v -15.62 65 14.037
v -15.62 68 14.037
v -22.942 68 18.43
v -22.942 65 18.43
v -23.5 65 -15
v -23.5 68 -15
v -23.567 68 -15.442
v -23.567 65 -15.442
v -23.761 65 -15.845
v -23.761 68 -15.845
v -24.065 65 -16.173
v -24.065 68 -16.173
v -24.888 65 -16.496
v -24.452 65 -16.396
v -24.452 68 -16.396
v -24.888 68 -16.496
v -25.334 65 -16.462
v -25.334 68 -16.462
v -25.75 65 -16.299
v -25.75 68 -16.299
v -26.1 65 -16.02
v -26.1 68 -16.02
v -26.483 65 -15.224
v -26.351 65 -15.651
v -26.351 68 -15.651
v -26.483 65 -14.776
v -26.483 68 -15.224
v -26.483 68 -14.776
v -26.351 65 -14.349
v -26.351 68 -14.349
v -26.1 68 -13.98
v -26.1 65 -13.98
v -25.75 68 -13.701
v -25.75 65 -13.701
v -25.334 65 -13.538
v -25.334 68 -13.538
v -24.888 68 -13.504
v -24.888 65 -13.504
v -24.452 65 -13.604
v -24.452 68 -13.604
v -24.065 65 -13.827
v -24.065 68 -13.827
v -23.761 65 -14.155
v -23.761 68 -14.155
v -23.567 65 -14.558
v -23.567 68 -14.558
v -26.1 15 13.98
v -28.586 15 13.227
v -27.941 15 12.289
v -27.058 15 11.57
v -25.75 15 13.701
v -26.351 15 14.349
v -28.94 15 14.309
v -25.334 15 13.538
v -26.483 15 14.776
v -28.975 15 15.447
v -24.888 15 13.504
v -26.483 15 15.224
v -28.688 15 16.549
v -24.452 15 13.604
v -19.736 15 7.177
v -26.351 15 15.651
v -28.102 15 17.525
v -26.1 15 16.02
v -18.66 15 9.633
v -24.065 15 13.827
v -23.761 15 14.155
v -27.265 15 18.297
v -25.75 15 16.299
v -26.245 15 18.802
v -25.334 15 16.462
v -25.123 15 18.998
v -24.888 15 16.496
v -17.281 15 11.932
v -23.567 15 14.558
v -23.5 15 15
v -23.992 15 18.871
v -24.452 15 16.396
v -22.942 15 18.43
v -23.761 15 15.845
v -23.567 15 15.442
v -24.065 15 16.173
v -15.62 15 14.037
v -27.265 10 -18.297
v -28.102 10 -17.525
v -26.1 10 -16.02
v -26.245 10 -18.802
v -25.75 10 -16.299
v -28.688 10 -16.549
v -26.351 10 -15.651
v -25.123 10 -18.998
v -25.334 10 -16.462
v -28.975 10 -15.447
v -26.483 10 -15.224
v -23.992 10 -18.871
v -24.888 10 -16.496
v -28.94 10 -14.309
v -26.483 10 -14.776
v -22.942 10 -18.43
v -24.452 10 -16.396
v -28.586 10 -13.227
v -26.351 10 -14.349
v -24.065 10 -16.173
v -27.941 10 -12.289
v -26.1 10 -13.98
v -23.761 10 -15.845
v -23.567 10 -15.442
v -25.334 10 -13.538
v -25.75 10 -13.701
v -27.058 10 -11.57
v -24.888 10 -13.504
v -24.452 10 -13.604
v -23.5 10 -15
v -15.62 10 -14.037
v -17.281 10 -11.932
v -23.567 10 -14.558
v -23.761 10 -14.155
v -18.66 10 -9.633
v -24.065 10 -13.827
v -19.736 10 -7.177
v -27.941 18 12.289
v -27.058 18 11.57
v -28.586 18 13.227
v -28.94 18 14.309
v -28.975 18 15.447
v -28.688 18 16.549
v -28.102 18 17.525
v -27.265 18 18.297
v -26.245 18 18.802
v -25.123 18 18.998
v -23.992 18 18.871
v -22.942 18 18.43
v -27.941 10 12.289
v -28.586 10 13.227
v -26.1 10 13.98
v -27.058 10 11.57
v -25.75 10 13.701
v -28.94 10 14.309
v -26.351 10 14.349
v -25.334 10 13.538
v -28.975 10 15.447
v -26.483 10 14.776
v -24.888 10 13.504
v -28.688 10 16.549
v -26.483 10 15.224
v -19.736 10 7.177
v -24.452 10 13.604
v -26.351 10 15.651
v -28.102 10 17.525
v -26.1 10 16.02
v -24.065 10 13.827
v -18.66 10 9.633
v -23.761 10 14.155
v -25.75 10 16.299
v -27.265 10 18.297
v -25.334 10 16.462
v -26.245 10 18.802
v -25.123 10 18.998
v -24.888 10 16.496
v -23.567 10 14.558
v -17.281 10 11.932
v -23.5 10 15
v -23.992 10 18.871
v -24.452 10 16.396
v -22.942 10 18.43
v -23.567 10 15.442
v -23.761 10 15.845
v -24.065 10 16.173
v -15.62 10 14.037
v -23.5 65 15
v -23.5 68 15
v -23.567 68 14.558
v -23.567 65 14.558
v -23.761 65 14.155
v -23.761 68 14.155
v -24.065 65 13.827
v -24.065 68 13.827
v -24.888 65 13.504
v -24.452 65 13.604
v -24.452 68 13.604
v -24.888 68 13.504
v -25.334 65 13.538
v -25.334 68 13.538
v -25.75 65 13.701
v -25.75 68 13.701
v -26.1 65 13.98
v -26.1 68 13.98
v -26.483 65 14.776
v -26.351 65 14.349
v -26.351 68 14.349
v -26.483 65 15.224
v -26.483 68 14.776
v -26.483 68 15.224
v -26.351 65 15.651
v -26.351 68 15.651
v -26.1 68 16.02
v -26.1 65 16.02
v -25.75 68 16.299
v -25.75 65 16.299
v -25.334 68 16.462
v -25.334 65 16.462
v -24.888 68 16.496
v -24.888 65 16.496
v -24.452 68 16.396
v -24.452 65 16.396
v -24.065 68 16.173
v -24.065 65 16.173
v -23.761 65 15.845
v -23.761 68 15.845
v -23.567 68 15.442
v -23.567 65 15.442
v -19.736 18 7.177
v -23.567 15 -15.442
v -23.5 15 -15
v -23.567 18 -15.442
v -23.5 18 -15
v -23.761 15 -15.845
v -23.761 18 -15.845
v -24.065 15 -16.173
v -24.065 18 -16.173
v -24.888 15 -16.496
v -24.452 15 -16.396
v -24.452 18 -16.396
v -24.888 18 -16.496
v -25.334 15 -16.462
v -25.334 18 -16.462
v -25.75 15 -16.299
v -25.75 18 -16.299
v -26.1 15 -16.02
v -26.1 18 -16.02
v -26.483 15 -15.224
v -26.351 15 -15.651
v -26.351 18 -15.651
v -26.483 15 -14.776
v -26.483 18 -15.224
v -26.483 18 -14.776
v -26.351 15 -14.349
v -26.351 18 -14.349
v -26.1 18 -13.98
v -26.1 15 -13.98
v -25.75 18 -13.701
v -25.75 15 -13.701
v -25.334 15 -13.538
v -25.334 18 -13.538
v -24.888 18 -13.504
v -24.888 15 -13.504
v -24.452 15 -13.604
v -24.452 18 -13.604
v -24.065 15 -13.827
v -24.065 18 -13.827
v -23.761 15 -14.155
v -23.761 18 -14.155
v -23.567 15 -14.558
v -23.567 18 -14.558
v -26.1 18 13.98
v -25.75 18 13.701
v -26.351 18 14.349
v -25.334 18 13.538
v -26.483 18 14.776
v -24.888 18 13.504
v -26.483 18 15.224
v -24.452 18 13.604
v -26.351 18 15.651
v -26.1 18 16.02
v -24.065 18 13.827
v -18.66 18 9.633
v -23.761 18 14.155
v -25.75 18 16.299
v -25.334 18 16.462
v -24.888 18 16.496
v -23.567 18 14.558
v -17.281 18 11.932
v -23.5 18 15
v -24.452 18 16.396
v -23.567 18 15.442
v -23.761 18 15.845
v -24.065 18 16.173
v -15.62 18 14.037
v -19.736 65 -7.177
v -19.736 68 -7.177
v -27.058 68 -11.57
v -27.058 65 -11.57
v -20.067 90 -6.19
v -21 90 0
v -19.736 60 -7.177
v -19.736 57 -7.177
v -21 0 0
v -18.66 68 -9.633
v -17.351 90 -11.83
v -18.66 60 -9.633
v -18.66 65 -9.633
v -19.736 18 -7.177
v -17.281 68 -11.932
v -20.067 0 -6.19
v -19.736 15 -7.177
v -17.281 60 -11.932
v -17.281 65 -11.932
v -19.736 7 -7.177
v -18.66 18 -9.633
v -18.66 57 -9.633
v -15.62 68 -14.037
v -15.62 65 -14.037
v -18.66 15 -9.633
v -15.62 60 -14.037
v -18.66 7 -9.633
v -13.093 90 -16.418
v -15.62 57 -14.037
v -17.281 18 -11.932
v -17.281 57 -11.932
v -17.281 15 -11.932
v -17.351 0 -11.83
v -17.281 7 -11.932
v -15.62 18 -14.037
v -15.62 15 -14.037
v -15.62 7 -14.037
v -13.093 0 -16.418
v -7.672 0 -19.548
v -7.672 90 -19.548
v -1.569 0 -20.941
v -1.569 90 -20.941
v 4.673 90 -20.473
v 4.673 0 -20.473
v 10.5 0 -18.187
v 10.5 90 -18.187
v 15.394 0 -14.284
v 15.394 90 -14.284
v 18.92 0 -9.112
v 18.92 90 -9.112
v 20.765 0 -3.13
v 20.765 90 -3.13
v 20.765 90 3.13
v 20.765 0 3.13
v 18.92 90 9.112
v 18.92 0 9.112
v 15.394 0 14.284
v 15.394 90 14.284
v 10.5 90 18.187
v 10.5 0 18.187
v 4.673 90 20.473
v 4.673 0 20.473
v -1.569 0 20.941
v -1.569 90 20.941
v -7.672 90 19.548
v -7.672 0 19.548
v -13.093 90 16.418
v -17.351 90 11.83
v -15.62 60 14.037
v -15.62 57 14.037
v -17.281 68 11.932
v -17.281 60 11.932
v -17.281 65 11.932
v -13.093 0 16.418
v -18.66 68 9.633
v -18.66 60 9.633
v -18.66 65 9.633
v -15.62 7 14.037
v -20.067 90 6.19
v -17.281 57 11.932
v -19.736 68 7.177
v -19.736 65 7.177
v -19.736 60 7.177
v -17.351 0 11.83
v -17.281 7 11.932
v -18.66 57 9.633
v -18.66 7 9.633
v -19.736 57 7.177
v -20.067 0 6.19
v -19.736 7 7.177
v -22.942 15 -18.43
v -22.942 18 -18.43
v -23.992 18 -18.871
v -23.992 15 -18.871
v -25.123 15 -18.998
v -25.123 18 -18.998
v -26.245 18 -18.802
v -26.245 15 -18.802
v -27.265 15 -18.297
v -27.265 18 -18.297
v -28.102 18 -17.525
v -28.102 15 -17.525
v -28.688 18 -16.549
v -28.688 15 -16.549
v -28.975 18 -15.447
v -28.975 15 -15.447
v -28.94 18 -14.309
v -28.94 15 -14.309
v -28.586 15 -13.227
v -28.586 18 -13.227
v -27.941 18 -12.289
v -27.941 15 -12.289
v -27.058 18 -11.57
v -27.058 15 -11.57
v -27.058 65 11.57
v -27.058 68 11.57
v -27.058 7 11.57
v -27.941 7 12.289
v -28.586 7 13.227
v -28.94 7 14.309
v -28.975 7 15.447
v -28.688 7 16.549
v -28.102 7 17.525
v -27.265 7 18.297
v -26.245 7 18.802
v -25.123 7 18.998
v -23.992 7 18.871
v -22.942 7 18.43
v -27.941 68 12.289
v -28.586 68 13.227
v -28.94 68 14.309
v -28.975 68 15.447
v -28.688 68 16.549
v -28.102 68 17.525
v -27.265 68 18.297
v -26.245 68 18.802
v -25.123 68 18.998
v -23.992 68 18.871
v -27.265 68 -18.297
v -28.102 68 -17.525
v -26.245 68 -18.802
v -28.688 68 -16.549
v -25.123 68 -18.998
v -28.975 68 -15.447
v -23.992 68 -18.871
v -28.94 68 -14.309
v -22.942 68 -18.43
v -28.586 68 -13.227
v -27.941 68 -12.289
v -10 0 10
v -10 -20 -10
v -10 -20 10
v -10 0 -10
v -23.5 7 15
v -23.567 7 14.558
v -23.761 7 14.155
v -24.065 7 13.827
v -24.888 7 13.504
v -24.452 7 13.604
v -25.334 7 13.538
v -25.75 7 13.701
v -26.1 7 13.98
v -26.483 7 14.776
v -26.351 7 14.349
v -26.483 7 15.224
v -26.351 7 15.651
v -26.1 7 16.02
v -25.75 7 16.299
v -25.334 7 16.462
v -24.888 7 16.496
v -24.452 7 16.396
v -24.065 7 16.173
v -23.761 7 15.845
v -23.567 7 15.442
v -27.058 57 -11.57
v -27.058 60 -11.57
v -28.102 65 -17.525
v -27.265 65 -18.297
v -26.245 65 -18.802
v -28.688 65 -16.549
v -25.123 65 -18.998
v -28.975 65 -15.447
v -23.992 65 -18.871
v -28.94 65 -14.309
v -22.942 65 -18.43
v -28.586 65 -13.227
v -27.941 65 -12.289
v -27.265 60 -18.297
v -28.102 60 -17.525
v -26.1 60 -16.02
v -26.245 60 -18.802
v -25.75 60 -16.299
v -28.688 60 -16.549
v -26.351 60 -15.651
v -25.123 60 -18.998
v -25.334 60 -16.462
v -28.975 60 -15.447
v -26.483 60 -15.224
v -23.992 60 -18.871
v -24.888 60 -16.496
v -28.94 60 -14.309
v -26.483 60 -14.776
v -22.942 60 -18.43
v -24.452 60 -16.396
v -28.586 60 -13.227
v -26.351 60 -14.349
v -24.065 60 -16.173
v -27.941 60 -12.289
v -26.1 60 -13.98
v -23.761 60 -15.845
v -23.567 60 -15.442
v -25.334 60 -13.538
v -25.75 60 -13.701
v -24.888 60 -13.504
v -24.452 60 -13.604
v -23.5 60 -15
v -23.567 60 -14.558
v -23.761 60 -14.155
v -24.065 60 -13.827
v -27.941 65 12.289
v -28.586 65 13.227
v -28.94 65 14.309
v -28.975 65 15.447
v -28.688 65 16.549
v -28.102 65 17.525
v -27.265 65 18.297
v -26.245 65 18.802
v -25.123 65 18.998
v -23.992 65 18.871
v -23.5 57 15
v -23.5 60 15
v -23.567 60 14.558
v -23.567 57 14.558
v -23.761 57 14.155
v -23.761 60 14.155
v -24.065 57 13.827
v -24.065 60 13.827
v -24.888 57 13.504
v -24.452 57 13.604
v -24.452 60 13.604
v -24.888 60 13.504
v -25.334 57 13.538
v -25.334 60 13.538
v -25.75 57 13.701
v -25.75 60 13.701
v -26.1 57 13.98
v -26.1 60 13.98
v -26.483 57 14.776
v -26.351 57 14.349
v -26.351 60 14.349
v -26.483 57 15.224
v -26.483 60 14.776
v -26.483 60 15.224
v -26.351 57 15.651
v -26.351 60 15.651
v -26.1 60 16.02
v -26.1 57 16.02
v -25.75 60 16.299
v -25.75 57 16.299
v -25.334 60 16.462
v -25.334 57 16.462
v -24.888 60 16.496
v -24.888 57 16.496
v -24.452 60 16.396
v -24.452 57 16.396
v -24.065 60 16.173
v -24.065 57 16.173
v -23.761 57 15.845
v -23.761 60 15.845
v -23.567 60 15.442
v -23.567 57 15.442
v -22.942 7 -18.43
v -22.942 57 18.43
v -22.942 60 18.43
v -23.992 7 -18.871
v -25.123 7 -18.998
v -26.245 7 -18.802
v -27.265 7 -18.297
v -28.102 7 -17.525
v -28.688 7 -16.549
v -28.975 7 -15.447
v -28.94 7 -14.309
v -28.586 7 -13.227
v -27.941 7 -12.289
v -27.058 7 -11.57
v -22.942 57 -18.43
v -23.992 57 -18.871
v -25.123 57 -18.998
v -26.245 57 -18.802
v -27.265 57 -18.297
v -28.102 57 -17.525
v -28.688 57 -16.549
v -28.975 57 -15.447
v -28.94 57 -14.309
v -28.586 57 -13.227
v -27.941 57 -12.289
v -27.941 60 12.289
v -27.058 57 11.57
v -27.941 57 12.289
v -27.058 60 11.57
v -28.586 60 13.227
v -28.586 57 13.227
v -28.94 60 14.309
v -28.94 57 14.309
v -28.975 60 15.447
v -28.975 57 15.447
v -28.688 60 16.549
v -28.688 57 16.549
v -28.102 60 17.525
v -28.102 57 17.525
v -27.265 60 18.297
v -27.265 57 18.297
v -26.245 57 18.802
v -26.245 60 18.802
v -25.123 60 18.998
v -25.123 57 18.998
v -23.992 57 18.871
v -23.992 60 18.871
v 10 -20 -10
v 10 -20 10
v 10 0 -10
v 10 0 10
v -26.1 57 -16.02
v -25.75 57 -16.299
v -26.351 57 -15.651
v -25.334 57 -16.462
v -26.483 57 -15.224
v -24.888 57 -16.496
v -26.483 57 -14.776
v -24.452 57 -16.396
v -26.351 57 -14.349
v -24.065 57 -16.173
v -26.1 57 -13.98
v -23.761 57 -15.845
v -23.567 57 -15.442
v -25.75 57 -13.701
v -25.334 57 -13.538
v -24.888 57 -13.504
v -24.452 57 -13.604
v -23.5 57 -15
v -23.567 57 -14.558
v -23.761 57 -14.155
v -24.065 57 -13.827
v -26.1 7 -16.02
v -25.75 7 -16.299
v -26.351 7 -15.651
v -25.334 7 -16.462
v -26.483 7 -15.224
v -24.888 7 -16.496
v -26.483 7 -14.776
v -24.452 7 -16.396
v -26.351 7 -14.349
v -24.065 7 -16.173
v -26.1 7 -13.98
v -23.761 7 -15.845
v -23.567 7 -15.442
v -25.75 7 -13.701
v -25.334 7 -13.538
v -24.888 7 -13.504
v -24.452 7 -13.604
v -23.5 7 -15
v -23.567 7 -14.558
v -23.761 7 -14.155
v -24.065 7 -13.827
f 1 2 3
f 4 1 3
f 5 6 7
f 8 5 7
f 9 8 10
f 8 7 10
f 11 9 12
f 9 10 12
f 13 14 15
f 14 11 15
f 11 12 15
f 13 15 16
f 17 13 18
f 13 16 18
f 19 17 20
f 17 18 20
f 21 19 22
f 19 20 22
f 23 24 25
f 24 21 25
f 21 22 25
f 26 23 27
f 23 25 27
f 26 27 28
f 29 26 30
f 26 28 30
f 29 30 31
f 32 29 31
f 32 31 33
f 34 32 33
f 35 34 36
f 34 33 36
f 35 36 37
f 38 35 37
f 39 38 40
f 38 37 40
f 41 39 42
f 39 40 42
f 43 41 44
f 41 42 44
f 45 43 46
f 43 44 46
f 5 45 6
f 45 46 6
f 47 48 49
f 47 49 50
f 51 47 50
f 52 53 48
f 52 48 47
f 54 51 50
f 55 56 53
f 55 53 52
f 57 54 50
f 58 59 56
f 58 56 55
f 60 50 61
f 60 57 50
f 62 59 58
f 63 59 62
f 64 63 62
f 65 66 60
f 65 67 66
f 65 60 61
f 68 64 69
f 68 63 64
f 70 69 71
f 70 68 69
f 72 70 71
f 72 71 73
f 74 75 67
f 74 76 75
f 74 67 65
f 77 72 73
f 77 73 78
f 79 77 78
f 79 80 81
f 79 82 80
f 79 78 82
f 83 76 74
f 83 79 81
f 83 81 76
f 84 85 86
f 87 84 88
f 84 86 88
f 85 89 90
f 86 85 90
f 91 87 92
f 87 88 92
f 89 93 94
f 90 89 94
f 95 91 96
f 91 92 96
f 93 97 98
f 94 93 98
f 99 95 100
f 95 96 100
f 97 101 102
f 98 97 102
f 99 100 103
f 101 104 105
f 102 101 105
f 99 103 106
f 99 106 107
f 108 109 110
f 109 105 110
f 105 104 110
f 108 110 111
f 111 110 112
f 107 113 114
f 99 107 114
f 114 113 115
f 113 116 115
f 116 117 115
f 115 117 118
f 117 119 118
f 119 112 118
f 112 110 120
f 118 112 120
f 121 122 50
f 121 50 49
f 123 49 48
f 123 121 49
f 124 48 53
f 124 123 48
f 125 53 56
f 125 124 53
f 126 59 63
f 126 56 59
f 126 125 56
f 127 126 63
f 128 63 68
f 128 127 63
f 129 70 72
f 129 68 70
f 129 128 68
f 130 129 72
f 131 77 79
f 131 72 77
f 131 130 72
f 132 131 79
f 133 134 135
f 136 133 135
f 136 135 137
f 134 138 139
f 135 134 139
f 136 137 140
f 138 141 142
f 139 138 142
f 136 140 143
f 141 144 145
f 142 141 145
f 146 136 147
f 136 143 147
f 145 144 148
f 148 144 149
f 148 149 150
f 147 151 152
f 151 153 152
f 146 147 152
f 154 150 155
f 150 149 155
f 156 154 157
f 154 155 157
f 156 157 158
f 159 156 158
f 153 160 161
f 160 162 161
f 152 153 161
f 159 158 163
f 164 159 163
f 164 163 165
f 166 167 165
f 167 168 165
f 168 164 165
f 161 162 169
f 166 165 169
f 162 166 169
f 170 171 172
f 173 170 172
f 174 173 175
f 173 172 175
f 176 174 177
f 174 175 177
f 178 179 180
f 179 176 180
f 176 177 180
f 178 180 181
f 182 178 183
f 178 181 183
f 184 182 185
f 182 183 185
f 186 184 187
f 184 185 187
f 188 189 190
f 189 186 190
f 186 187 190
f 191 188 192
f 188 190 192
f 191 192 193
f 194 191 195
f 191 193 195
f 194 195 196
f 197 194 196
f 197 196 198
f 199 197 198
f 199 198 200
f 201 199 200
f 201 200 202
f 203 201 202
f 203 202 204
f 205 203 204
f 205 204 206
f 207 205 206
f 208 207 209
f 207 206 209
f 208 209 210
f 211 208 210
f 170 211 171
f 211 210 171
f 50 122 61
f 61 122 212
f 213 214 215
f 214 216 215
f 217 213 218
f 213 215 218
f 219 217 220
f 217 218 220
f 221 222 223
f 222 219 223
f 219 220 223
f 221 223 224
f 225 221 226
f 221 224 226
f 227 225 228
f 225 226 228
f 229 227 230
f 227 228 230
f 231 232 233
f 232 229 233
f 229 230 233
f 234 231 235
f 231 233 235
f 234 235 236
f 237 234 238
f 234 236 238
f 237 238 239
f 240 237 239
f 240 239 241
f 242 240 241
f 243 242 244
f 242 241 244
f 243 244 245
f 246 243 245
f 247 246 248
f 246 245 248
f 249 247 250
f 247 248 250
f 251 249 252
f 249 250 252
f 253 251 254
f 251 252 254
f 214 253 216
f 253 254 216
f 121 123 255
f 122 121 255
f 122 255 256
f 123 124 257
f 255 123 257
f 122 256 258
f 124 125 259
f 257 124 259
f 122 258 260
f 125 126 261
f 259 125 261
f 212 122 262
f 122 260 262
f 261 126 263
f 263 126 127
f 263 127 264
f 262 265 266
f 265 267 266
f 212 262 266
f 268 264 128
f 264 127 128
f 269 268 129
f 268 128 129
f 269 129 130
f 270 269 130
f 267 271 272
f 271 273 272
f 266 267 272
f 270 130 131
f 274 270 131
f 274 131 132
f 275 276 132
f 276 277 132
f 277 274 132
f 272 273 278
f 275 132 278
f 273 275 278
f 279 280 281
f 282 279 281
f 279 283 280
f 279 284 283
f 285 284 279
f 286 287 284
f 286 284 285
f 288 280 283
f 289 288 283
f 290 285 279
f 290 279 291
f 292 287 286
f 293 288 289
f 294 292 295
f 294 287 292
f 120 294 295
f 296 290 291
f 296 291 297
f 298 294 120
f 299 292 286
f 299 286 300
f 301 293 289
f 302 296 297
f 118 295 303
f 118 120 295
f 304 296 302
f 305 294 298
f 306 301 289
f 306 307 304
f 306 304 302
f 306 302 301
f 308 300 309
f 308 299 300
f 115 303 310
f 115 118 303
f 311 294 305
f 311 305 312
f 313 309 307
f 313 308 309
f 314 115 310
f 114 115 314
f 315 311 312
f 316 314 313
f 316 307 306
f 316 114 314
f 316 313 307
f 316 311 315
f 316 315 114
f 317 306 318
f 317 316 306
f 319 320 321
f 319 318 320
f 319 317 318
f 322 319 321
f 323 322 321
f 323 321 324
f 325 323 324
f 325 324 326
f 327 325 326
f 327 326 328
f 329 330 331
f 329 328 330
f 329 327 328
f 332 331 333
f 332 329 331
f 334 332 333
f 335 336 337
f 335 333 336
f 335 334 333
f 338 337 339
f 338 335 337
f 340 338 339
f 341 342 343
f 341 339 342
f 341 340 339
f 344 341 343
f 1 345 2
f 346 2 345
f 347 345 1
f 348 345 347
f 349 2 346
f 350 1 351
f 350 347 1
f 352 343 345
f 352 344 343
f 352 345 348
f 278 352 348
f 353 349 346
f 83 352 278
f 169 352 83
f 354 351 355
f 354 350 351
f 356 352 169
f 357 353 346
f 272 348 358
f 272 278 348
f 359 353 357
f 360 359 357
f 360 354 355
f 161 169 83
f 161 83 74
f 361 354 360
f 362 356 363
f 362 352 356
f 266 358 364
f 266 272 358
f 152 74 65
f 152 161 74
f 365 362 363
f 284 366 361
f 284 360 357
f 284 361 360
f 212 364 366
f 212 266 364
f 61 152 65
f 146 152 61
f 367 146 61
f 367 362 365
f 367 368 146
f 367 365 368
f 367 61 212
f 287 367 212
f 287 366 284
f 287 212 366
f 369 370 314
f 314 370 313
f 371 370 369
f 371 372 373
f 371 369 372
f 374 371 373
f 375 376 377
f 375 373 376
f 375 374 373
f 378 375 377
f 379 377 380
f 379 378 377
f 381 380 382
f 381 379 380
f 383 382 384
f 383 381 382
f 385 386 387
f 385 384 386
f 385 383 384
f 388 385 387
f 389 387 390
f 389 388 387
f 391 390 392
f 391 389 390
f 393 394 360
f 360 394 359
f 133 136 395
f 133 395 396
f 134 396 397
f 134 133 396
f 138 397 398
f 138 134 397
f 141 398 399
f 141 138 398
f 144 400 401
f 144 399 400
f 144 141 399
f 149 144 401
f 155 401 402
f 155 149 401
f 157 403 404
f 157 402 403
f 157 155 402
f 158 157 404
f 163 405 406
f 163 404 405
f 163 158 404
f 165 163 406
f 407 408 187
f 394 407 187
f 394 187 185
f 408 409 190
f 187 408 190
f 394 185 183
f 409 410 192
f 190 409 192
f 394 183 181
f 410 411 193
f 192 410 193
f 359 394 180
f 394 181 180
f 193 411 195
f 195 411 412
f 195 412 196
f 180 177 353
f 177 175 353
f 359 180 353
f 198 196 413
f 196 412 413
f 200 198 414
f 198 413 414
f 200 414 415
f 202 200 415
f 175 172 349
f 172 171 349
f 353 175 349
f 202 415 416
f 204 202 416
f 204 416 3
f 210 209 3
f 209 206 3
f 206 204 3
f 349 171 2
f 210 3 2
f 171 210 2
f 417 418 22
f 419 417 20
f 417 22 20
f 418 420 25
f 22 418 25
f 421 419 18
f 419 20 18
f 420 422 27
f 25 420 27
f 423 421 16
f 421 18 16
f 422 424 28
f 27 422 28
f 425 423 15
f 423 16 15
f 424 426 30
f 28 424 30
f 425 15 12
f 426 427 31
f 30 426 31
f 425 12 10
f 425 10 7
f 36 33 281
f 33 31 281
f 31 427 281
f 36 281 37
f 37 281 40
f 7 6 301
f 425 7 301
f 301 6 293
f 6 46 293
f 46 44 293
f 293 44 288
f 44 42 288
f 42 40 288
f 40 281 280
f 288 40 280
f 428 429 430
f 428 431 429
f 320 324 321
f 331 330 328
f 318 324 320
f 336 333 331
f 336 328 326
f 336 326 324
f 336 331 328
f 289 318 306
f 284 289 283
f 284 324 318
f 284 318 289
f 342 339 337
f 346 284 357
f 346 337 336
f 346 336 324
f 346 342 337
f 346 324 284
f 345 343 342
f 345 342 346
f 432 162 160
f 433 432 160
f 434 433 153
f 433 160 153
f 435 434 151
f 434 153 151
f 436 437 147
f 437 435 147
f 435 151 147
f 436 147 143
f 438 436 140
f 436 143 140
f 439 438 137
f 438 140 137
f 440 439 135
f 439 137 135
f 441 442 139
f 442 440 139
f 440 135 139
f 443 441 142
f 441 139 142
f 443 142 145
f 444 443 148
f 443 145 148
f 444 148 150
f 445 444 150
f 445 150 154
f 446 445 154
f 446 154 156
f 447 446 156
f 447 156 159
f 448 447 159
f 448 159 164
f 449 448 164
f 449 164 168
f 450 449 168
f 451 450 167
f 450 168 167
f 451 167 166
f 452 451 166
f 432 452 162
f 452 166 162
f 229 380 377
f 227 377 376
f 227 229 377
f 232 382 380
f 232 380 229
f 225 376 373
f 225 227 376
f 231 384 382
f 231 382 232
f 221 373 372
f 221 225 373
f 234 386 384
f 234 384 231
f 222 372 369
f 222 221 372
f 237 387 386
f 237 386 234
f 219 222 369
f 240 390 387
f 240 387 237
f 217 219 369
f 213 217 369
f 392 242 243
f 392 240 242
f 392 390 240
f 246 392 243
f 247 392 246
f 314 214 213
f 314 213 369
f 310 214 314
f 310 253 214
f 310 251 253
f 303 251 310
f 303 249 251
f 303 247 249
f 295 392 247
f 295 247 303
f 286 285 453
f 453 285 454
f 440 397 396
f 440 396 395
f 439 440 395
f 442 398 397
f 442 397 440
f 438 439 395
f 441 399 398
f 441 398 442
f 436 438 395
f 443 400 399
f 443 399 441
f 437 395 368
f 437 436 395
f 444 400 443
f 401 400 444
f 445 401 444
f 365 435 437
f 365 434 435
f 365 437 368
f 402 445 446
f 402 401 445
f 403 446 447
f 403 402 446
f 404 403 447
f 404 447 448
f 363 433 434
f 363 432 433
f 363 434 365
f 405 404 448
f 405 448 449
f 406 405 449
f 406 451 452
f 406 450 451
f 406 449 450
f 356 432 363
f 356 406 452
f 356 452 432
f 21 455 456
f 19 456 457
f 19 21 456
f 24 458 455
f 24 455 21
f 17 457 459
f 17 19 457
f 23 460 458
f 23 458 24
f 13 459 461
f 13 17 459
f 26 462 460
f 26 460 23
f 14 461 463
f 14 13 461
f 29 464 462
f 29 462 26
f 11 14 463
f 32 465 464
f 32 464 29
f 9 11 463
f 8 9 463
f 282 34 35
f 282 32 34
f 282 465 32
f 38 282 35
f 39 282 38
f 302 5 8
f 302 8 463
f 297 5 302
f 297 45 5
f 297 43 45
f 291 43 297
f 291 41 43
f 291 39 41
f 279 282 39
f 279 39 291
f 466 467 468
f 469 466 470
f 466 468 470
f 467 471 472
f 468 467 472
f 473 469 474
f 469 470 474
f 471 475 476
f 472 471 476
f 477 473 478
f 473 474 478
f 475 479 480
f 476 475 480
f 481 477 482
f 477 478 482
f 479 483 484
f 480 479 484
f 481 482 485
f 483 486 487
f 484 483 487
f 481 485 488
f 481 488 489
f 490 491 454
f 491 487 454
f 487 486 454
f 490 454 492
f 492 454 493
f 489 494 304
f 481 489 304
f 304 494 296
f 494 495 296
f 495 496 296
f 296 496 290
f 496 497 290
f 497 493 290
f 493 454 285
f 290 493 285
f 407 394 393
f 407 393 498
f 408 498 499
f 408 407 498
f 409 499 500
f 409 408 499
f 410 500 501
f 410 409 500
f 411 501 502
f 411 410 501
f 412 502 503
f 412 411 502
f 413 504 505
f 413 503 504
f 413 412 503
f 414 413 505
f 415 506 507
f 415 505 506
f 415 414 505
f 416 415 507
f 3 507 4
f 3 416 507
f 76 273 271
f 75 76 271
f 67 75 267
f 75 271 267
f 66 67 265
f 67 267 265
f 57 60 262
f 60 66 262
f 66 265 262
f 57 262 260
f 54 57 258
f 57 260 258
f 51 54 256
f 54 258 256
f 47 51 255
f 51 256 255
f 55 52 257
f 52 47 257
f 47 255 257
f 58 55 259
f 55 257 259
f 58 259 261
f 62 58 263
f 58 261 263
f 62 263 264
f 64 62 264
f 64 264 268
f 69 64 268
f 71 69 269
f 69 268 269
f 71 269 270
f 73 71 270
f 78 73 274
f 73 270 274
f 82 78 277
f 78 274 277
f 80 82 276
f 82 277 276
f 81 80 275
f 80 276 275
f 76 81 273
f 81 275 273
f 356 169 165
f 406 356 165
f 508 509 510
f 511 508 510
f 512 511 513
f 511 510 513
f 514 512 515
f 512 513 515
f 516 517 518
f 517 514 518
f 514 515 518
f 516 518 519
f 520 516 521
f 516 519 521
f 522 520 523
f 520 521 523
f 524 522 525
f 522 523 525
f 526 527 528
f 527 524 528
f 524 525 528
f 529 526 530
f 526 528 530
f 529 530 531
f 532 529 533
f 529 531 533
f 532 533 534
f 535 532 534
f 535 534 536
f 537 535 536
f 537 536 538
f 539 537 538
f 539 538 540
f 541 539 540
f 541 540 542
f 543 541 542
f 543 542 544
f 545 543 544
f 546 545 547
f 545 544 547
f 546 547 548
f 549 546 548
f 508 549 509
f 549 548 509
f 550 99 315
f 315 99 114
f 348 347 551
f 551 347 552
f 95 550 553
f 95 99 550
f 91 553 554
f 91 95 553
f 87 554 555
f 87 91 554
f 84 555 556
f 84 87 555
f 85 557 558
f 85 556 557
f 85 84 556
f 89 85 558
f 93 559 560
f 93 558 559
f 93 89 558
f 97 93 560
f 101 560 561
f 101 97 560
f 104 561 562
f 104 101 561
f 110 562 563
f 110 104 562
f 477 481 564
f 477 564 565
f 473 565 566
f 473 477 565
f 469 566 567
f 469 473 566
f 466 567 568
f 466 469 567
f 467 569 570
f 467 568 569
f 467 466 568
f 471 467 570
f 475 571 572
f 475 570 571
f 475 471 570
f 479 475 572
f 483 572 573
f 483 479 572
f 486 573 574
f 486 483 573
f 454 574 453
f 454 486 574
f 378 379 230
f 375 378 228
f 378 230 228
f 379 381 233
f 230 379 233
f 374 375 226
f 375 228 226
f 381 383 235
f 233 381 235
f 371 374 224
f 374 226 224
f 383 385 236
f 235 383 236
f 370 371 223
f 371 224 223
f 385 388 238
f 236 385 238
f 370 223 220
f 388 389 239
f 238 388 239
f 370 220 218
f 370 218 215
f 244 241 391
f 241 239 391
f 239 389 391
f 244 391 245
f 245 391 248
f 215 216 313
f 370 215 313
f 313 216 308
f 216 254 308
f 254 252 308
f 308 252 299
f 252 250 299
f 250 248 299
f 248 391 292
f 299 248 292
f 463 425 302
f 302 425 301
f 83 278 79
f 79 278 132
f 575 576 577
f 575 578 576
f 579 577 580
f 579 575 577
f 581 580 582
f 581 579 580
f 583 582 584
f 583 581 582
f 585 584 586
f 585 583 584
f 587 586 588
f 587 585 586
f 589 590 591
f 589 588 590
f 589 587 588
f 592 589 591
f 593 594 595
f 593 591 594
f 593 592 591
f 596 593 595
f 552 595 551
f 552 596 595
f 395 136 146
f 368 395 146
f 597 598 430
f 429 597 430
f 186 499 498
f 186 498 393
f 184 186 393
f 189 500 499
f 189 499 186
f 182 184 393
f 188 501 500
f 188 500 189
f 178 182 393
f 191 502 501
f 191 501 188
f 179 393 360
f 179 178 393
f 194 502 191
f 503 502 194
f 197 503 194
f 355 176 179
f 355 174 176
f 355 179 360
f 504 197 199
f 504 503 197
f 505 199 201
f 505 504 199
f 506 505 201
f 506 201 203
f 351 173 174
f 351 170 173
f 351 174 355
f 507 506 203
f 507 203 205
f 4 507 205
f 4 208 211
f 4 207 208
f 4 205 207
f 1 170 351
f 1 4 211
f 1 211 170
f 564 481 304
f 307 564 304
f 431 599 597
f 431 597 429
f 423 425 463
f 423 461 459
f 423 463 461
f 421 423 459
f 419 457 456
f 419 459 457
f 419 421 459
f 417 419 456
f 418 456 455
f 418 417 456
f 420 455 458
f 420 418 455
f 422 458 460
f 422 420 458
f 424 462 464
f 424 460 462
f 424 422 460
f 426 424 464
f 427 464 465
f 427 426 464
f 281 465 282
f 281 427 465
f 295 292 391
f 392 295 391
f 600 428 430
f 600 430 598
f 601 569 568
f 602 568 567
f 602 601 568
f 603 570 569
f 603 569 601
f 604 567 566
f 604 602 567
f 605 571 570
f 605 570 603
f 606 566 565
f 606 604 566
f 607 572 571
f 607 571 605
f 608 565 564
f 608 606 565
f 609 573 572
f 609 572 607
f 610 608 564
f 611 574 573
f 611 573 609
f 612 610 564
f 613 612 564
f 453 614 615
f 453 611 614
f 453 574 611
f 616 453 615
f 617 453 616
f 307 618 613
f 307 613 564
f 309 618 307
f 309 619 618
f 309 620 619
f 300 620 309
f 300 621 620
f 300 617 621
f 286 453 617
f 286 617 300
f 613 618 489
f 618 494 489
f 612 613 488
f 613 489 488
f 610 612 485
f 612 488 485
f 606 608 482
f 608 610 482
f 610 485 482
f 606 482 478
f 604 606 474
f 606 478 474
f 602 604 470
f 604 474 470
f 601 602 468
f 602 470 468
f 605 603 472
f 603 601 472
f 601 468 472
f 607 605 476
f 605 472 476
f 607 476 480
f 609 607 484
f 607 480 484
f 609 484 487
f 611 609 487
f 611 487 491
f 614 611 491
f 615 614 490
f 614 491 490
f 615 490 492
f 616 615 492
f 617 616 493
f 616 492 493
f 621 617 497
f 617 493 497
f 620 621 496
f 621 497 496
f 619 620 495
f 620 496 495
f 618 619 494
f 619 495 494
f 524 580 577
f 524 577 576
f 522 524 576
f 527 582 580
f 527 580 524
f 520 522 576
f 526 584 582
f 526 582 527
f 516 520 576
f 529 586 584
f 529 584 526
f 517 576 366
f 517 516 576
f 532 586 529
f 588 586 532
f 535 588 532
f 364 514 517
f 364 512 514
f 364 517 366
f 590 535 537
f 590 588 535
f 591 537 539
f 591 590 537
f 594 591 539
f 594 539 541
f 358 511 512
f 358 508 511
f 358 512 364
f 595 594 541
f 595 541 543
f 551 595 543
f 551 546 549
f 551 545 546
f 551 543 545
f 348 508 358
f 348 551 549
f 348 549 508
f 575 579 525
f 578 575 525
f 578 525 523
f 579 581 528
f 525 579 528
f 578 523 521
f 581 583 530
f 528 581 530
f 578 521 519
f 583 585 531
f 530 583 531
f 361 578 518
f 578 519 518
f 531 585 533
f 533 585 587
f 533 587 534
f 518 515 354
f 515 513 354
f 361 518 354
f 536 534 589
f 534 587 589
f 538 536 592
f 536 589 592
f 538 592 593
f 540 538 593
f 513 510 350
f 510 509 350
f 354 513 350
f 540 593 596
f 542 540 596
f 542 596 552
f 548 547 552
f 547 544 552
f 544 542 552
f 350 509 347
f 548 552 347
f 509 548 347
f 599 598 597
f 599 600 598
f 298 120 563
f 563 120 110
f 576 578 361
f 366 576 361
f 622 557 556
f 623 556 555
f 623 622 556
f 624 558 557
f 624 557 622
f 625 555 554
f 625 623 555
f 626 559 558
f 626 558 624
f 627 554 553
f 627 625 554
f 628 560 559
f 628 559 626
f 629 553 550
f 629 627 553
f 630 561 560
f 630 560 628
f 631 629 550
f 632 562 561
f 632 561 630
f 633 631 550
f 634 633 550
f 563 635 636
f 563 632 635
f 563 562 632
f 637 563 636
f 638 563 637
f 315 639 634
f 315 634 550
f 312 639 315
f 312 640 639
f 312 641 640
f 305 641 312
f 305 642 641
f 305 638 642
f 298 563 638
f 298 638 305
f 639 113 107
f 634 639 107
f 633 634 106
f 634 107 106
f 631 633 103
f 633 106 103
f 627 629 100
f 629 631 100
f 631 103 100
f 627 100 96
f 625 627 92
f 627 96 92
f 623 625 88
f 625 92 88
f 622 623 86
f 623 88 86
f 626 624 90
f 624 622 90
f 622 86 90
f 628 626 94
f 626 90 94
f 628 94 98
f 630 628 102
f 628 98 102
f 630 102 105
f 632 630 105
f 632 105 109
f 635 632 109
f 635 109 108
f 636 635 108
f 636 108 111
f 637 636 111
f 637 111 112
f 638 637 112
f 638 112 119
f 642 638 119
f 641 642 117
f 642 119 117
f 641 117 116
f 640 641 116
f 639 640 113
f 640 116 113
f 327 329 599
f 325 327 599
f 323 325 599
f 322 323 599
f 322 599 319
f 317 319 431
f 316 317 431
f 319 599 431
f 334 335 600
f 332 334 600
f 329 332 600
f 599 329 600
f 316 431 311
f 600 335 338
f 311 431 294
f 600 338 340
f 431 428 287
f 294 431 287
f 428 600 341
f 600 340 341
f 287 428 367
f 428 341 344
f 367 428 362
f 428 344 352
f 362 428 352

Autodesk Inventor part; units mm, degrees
ref_plane "YZ Plane" through (0, 0, 0) normal (1, 0, 0) x (0, 1, 0)
ref_plane "XZ Plane" through (0, 0, 0) normal (0, 1, 0) x (-1, 0, 0)
sketch "Sketch1" plane through (0, 0, 0) normal (0, 1, 0) x (-1, 0, 0)
  circle A0 centre (0, 0) radius 21
  line L0 (10, 10) -> (-10, 10)
  line L1 (-10, 10) -> (-10, -10)
  line L2 (-10, -10) -> (10, -10)
  line L3 (10, -10) -> (10, 10)
  line L4 (10, 10) -> (-10, -10) construction
  line L5 (-10, 10) -> (10, -10) construction
  dimension "d0" = 42
  dimension "d1" = 20
  dimension "d2" = 20
extrude "Extrusion1" add sketch "Sketch1" along normal blind 90 contours A0 | L3 L2 L1 L0
extrude "Extrusion2" add sketch "Sketch1" against normal blind 20 contours L3 L2 L1 L0
ref_plane "Work Plane1" through (0, 10, 0) normal (0, -1, 0) x (1, 0, 0)
sketch "Sketch2" plane through (0, 10, 0) normal (0, -1, 0) x (1, 0, 0)
  circle A0 centre (-25, 15) radius 1.5
  circle A1 centre (-25, -15) radius 1.5
  circle A2 centre (0, 0) radius 21 projected
  line L0 (-15.6197, 14.0366) -> (-22.942, 18.43)
  arc A3 (-22.942, 18.43) -> (-27.058, 11.57) centre (-25, 15) ccw
  line L1 (-27.058, 11.57) -> (-19.7357, 7.1766)
  line L2 (-19.7357, -7.1766) -> (-27.058, -11.57)
  arc A4 (-27.058, -11.57) -> (-22.942, -18.43) centre (-25, -15) ccw
  line L3 (-22.942, -18.43) -> (-15.6197, -14.0366)
  line L4 (-25, 15) -> (0, 0) construction
  line L5 (0, 0) -> (-25, -15) construction
  point P0 (-21, 0)
  dimension "d8" = 3
  dimension "d9" = 30
  dimension "d10" = 15
  dimension "d11" = 4
  dimension "d12" = 4
  dimension "d13" = 4
extrude "Extrusion3" add sketch "Sketch2" along normal blind 3 contours A2 L1 A3 L0 | L3 A4 L2 A2
pattern_linear "Rectangular Pattern2" count 2 spacing 8 along (0, 1, 0) of "Extrusion3"
pattern_linear "Rectangular Pattern1" count 2 spacing 50 along (0, 1, 0) of "Extrusion3", "Rectangular Pattern2"
properties part number "MockPitchMotor" material "ABS Plastic"
